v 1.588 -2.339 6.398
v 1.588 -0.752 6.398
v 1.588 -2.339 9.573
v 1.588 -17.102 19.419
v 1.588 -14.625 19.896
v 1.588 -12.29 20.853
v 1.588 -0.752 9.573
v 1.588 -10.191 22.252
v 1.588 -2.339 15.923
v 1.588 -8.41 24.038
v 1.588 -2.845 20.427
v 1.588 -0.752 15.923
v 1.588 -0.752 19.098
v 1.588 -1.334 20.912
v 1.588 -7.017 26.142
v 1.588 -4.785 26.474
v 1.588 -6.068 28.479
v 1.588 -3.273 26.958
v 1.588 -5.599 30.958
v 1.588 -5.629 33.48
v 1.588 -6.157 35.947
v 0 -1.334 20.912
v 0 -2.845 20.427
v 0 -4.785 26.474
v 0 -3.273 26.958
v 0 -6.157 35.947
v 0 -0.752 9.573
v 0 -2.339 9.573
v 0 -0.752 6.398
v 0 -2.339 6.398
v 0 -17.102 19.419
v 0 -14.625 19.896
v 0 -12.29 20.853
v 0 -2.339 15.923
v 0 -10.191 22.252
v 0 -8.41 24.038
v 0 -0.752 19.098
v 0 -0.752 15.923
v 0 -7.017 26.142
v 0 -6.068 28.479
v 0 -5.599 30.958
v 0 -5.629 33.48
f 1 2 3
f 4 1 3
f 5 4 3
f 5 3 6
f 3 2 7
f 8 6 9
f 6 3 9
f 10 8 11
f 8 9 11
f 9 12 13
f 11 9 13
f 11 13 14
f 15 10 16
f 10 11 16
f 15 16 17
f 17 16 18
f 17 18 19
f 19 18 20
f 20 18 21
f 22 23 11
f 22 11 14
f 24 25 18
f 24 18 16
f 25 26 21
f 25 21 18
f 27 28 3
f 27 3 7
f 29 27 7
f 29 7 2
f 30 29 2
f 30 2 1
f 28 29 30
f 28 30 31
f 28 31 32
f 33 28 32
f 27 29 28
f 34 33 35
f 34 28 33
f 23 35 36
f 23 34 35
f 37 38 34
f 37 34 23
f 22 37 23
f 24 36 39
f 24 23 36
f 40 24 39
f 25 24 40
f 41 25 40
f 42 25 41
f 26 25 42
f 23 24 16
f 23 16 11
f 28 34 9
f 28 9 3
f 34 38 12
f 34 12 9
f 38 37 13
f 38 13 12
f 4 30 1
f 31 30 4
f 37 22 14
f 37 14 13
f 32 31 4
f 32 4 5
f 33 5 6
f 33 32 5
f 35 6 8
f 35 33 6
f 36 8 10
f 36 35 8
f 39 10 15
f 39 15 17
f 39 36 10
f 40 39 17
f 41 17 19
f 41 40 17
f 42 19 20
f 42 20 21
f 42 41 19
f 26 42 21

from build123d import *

# Parameters (mm, degrees)
BOSS_EXTRUDE1_DEPTH = 1.5875


with BuildPart() as part:
    # Sketch1 → Boss-Extrude1 (new body)
    with BuildSketch(Plane(origin=(0, 0, 0), x_dir=(0, 0, -1), z_dir=(1, 0, 0))):
        with BuildLine():
            Line((-6.398003714, -0.75184), (-6.398003714, -2.33934))
            Line((-6.398003714, -2.33934), (-19.419469424, -17.102153274))
            ThreePointArc((-19.419469424, -17.102153274), (-25.055238608, -7.661312267), (-35.94689414, -6.156914384))
            Line((-35.94689414, -6.156914384), (-26.958444364, -3.273446191))
            Line((-26.958444364, -3.273446191), (-26.473520097, -4.785069393))
            Line((-26.473520097, -4.785069393), (-20.427027289, -2.845372323))
            Line((-20.427027289, -2.845372323), (-20.911951556, -1.333749121))
            Line((-20.911951556, -1.333749121), (-19.098003714, -0.75184))
            Line((-19.098003714, -0.75184), (-15.923003714, -0.75184))
            Line((-15.923003714, -0.75184), (-15.923003714, -2.33934))
            Line((-15.923003714, -2.33934), (-9.573003714, -2.33934))
            Line((-9.573003714, -2.33934), (-9.573003714, -0.75184))
            Line((-9.573003714, -0.75184), (-6.398003714, -0.75184))
        make_face()
    extrude(amount=BOSS_EXTRUDE1_DEPTH)


solid = part.part
